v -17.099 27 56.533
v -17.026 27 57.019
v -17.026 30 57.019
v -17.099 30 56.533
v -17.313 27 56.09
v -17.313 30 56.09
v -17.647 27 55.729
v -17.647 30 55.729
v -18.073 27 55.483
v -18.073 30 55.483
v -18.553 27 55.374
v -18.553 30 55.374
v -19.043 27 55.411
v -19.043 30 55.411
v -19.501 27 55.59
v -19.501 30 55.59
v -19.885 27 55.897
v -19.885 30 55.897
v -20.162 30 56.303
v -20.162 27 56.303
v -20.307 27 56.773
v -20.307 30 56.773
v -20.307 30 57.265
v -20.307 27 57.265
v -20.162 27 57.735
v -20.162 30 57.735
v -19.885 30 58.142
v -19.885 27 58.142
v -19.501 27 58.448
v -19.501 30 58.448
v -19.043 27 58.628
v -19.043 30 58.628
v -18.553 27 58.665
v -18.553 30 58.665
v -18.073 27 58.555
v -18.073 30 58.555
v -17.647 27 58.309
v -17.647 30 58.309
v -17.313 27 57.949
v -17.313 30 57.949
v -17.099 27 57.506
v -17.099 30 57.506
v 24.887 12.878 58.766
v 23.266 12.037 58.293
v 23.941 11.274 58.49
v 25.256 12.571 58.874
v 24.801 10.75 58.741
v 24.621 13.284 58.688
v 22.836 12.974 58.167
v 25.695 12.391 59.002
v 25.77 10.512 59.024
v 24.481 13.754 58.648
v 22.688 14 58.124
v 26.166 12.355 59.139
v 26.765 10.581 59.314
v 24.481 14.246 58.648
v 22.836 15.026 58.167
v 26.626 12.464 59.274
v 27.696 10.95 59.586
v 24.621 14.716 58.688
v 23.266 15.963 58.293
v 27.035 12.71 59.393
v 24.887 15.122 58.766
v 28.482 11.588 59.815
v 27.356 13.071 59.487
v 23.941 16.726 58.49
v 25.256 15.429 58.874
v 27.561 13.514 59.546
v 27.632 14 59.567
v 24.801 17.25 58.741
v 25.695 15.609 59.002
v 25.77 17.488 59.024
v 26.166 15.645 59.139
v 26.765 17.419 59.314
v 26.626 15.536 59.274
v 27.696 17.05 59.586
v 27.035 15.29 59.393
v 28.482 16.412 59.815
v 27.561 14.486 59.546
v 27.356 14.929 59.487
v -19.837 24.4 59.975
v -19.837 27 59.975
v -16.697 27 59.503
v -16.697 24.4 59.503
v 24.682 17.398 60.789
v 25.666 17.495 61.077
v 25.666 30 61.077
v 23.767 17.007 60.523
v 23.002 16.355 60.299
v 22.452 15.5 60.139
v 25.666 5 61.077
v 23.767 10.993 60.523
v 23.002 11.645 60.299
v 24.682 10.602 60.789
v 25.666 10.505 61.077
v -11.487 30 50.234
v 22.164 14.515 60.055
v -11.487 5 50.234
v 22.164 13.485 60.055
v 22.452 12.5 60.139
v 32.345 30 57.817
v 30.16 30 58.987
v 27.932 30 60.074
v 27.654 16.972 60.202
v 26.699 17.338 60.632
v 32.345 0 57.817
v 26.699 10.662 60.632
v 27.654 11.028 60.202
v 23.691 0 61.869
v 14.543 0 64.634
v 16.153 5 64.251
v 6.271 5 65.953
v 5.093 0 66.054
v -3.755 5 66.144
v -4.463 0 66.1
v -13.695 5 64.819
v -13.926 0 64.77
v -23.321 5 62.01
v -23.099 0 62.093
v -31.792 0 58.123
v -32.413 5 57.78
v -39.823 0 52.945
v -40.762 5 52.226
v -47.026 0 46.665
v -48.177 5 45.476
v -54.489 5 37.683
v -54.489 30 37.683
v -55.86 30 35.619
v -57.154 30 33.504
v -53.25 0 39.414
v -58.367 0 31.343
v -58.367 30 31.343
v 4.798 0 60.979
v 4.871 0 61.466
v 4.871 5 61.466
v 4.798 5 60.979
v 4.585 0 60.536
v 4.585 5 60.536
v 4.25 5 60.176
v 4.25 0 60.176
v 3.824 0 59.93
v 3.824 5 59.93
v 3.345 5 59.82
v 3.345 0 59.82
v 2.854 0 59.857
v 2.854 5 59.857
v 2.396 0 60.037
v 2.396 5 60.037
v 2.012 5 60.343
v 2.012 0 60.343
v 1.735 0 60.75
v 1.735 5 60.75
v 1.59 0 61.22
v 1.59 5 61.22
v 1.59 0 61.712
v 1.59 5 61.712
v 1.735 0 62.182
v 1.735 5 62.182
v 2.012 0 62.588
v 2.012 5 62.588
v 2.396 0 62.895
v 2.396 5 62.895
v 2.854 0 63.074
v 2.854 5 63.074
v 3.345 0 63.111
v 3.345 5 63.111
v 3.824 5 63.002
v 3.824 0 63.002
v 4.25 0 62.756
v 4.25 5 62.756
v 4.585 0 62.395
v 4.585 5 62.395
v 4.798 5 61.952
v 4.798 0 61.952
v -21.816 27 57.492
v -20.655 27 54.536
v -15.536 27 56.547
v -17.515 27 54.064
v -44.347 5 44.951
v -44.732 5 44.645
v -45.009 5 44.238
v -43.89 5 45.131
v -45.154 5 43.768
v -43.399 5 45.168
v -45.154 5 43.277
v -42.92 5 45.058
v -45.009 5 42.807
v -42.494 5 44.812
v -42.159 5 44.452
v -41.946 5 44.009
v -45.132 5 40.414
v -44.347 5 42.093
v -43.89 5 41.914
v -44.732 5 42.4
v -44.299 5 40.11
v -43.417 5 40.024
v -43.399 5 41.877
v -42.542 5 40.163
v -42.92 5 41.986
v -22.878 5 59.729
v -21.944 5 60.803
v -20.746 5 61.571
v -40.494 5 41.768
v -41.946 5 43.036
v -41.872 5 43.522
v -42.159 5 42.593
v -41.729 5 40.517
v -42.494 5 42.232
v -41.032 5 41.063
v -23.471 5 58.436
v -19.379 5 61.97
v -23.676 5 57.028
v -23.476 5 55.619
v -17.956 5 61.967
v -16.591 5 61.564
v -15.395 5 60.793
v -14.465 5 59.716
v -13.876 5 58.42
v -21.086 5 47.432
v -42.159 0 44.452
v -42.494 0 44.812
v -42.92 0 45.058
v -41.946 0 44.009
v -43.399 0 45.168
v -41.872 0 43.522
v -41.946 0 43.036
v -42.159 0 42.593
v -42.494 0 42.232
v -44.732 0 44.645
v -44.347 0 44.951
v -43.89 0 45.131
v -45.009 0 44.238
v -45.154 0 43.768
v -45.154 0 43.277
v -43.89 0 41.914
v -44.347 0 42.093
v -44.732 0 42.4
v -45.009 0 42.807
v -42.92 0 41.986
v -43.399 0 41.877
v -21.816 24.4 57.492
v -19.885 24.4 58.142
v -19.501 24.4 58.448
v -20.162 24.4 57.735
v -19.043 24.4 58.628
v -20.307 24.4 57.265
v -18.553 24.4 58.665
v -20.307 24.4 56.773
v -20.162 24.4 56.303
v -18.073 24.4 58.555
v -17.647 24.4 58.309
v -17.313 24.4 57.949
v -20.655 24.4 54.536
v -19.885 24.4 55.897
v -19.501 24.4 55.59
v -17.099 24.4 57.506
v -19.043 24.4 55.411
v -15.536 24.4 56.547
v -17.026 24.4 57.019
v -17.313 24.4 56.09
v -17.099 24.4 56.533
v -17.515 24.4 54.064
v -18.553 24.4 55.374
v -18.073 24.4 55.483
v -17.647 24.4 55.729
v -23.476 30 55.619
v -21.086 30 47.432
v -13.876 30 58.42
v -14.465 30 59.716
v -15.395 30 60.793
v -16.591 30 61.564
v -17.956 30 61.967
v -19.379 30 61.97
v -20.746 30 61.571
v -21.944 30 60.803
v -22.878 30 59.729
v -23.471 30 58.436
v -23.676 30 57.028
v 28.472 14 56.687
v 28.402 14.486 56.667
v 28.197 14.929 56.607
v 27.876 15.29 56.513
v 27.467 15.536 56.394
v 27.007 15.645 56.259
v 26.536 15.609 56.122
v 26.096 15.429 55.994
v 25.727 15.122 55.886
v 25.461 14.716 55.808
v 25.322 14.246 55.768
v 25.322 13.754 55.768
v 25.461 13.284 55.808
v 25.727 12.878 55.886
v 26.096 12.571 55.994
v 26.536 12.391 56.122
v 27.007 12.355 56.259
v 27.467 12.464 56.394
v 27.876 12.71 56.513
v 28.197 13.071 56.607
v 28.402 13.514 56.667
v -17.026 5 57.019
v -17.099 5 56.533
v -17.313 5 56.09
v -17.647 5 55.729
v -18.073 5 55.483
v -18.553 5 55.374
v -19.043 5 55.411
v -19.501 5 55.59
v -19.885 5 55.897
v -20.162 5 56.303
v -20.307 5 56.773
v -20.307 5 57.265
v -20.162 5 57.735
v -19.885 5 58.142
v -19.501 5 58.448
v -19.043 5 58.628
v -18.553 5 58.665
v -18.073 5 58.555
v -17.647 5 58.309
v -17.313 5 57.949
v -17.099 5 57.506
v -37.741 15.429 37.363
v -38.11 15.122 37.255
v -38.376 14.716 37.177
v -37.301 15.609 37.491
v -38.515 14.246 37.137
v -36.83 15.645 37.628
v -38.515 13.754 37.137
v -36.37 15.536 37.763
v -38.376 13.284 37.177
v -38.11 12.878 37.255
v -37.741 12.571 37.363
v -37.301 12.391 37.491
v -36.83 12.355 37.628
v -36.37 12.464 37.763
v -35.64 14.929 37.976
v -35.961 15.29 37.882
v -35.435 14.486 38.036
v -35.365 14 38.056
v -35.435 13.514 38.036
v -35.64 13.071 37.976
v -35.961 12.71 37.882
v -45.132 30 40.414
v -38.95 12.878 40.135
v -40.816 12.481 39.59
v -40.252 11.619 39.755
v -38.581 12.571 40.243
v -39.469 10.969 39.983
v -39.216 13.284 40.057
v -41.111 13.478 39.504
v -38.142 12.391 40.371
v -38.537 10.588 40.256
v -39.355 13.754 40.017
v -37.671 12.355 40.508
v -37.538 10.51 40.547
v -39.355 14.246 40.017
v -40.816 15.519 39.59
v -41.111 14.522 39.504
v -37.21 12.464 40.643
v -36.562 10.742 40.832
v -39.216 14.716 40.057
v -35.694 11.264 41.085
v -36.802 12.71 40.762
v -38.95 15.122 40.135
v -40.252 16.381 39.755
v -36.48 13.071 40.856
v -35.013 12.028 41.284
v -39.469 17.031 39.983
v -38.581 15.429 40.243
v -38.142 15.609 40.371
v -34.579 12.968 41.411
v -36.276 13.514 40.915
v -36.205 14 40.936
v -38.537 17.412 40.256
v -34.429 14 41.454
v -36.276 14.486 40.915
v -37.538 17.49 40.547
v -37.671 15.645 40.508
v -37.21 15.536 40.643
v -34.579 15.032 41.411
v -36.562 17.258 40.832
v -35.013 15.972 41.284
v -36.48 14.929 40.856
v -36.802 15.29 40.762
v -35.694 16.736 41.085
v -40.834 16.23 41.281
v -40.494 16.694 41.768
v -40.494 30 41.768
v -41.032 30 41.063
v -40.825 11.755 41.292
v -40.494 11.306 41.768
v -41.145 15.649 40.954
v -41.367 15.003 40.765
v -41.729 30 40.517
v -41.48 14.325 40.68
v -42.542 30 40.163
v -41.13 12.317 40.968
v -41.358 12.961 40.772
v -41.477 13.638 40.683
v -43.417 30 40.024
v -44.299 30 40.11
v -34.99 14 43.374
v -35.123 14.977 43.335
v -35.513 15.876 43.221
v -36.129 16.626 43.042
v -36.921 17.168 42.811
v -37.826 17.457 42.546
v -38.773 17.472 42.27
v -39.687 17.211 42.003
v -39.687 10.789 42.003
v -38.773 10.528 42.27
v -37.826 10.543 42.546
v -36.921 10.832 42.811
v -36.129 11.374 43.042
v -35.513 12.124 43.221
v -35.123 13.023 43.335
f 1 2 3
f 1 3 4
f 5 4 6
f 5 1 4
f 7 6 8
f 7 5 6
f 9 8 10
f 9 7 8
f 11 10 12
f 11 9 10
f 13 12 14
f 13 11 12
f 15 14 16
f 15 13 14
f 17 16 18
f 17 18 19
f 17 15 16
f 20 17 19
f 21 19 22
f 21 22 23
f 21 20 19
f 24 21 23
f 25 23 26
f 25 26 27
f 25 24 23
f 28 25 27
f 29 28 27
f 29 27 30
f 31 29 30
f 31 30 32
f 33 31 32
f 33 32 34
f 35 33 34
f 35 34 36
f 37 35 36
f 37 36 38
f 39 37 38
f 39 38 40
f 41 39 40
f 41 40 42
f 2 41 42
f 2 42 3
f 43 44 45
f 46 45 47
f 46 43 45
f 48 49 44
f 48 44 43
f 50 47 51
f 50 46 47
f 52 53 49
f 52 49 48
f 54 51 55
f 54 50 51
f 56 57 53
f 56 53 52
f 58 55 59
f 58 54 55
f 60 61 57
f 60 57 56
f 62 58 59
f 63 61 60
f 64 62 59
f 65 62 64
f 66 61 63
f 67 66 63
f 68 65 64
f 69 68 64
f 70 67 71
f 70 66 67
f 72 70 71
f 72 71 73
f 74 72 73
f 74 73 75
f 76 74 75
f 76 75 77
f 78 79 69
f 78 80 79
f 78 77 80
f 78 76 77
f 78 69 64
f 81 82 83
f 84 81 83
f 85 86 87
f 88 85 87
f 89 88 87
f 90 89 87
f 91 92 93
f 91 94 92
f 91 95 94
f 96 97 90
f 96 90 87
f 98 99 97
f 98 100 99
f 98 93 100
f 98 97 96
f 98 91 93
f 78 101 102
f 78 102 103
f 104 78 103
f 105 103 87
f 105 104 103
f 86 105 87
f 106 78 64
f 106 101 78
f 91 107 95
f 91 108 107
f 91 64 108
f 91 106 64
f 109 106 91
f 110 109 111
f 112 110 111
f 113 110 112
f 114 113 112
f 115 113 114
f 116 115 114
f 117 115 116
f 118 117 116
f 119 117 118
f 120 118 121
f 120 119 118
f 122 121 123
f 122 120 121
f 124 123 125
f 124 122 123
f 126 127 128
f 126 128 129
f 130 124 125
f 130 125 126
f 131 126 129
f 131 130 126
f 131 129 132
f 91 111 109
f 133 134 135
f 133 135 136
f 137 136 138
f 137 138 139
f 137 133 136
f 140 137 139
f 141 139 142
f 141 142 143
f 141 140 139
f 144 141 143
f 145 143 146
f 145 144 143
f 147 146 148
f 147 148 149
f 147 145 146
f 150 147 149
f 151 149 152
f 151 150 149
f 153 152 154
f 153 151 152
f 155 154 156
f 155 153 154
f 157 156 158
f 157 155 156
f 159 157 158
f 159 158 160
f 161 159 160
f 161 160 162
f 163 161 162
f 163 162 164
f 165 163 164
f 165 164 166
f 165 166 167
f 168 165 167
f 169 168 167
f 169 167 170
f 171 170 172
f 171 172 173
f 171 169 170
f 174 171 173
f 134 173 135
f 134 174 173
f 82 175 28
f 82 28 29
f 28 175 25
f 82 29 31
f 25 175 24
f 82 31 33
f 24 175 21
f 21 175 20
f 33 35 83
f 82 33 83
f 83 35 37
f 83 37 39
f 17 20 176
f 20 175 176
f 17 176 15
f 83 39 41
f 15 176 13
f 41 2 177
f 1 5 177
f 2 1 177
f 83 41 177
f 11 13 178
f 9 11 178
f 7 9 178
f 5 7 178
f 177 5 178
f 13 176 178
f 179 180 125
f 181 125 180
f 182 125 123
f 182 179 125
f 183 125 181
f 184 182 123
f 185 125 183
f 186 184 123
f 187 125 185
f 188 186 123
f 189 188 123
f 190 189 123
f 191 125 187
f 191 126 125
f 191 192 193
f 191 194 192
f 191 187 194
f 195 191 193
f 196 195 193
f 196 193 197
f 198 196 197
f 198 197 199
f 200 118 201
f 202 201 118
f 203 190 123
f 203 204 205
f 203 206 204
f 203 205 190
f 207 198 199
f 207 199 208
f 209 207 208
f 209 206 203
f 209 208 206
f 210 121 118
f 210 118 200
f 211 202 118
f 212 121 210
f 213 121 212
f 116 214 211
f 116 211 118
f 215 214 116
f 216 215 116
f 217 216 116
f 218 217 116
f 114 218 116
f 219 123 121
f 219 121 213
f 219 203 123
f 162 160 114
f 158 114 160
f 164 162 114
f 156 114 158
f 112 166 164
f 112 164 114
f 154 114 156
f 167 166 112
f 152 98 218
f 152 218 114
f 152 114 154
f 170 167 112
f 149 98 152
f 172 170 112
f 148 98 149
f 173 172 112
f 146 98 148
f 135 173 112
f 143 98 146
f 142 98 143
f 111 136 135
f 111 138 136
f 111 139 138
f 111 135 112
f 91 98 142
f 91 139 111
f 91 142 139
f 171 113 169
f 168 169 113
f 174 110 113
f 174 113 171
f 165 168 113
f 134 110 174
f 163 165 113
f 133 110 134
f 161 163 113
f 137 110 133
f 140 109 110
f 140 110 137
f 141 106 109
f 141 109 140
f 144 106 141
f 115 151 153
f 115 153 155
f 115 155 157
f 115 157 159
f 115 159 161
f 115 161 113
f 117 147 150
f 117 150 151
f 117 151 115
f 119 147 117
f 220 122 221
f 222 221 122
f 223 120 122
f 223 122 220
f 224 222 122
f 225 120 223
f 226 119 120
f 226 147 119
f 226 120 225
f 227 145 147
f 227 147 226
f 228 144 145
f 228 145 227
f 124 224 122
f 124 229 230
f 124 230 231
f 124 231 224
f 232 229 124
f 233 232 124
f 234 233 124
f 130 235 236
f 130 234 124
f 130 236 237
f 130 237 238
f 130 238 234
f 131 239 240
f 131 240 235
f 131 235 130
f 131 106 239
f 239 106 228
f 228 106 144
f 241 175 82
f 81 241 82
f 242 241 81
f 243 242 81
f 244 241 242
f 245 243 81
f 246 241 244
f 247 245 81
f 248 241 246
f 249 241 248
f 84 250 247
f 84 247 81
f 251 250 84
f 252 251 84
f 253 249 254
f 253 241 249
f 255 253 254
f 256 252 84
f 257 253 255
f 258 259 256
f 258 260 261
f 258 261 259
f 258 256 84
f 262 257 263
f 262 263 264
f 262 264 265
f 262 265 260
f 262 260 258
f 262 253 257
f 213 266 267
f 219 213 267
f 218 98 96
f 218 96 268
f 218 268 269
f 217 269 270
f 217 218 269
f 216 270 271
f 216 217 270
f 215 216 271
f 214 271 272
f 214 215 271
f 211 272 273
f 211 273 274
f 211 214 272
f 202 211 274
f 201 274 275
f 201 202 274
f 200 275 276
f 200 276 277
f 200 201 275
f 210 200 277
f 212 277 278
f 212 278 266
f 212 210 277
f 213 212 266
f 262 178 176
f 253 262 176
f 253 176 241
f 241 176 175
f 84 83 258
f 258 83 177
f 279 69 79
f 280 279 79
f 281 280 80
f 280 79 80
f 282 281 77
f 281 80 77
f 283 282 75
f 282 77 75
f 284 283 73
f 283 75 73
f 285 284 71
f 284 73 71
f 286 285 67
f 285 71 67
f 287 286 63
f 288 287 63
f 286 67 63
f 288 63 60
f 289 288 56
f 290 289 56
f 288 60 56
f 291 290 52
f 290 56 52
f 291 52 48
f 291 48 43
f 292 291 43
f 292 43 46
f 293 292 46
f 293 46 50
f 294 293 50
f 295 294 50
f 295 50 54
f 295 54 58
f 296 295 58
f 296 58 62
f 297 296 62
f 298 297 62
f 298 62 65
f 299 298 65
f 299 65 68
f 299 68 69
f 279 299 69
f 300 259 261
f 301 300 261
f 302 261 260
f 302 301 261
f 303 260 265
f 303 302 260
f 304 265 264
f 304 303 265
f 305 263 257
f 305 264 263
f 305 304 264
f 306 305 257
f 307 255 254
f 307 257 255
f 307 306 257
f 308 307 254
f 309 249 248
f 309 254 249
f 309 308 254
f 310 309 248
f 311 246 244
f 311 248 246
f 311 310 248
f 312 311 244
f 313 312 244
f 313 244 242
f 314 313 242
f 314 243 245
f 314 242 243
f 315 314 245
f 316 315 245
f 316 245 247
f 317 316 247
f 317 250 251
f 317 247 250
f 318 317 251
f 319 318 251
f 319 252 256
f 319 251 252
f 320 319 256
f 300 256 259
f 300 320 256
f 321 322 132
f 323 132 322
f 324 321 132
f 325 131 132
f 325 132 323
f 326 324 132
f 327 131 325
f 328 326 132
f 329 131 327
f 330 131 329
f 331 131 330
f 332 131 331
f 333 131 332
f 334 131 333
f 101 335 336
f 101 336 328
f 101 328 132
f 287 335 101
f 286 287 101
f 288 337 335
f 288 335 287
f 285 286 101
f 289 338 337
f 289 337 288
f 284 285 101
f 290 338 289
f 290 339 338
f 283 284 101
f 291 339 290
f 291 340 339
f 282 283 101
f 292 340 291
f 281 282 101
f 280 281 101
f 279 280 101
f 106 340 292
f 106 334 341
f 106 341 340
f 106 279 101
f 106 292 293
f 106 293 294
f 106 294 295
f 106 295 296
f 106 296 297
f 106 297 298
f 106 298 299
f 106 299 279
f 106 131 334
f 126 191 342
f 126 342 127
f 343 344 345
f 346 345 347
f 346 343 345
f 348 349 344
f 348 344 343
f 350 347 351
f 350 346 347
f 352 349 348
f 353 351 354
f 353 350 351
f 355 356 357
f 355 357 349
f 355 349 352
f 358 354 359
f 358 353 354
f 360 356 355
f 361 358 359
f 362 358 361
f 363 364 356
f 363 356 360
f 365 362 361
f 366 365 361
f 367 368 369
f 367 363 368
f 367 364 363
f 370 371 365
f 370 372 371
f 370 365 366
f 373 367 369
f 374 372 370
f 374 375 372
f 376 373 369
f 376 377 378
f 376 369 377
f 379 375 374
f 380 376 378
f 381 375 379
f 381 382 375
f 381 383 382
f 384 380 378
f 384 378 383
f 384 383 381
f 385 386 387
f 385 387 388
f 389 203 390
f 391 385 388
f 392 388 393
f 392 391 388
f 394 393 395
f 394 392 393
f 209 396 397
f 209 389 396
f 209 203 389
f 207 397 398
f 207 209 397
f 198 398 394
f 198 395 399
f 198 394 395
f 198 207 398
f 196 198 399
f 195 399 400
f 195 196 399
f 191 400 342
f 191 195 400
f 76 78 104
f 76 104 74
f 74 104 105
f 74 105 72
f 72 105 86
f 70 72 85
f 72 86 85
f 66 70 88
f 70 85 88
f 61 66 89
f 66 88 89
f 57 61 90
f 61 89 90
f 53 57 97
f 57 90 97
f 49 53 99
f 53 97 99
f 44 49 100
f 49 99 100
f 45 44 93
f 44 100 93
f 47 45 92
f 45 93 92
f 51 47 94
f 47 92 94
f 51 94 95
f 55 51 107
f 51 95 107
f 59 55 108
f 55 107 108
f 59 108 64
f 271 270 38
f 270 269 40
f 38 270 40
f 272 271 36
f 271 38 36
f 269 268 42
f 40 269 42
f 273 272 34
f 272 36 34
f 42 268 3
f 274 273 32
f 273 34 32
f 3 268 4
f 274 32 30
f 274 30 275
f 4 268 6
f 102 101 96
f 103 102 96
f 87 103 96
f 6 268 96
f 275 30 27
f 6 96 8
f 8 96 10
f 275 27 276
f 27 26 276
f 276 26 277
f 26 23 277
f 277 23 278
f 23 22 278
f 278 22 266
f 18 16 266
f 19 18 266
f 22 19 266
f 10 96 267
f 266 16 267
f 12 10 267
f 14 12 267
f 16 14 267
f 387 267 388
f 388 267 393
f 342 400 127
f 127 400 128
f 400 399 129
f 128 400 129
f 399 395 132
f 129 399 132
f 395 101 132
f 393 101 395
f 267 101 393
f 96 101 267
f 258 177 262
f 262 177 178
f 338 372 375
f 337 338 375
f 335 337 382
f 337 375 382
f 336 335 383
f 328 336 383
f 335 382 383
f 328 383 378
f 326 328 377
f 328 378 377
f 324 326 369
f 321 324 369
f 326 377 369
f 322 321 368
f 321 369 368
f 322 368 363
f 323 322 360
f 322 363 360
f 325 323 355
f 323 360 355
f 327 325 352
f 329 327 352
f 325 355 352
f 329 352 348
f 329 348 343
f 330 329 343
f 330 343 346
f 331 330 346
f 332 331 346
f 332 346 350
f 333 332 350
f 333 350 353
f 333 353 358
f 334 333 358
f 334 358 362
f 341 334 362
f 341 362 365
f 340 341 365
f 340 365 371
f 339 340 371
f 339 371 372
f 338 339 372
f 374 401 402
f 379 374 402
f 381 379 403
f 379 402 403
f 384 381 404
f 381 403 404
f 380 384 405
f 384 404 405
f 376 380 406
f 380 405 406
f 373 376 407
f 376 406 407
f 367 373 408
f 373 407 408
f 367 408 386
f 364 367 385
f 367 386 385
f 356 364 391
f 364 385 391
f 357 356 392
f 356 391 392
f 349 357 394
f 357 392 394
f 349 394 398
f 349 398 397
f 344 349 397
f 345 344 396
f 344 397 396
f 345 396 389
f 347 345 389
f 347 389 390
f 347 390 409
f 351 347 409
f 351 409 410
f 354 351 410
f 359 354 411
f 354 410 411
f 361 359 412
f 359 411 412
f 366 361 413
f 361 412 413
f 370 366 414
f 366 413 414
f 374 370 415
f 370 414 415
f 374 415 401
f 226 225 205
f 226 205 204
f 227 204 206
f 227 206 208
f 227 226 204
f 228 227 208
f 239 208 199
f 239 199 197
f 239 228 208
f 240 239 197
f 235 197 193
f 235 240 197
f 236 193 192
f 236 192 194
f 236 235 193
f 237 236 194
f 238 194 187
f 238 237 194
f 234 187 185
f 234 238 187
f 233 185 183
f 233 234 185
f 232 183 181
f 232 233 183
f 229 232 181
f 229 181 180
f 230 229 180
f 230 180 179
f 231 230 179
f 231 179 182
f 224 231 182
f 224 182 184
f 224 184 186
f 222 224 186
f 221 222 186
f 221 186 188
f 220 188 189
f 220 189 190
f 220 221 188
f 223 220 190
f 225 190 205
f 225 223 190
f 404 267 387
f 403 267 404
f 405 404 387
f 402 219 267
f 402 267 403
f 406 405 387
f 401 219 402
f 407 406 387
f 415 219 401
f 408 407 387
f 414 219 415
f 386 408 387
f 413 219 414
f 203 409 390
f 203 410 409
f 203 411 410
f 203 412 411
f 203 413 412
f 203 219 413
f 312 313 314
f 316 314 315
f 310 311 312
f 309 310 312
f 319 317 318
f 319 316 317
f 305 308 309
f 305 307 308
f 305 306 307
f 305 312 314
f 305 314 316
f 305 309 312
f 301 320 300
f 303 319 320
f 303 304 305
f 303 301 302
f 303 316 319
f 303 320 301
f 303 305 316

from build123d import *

# Parameters (mm, degrees)
SKETCH1_R           = 1.65
BOSS_EXTRUDE1_DEPTH = 5
BOSS_EXTRUDE2_DEPTH = 25
SKETCH3_R           = 1.65
CUT_EXTRUDE1_DEPTH  = 31.640005718
SKETCH4_R           = 3.5
CUT_EXTRUDE2_DEPTH  = 2
SKETCH5_R           = 67.5
SKETCH5_R_2         = 66.25
CUT_EXTRUDE3_DEPTH  = 31.0000001
SKETCH6_R           = 1.65
BOSS_EXTRUDE3_DEPTH = 30
CUT_EXTRUDE4_START  = -3
CUT_EXTRUDE4_DEPTH  = 2.6


with BuildPart() as part:
    # Sketch1 → Boss-Extrude1 (new body)
    with BuildSketch(Plane(origin=(0, 0, 0), x_dir=(1, 0, 0), z_dir=(0, 1, 0))):
        with BuildLine():
            ThreePointArc((-58.769725256, -31.225340563), (-18.644922026, -63.884813396), (32.748082014, -57.935012077))
            Line((32.748082014, -57.935012077), (-58.769725256, -31.225340563))
        make_face()
        with Locations((-43.522422382, -43.522422382)):
            Circle(SKETCH1_R, mode=Mode.SUBTRACT)
        with Locations((3.221278107, -61.465647864)):
            Circle(SKETCH1_R, mode=Mode.SUBTRACT)
    extrude(amount=BOSS_EXTRUDE1_DEPTH)

    # Sketch2 → Boss-Extrude2 (add)
    with BuildSketch(Plane(origin=(0, 5, 0), x_dir=(1, 0, 0), z_dir=(0, 1, 0))):
        with BuildLine():
            Line((-58.769725256, -31.225340563), (32.748082014, -57.935012077))
            ThreePointArc((32.748082014, -57.935012077), (29.480015366, -59.664320946), (26.120952253, -61.20946294))
            Line((26.120952253, -61.20946294), (-40.494047404, -41.767730103))
            ThreePointArc((-40.494047404, -41.767730103), (-42.54184797, -40.162589972), (-45.131562946, -40.414261085))
            Line((-45.131562946, -40.414261085), (-54.944236671, -37.550410872))
            ThreePointArc((-54.944236671, -37.550410872), (-56.94486731, -34.441030575), (-58.769725256, -31.225340563))
        make_face()
    extrude(amount=BOSS_EXTRUDE2_DEPTH)

    # Sketch3 → Cut-Extrude1 (cut, through all)
    with BuildSketch(Plane(origin=(-14.411642209, 0, 49.379936906), x_dir=(0.959952117, 0, 0.280164118), z_dir=(-0.280164118, 0, 0.959952117))):
        with Locations((41.56355859, 14)):
            Circle(SKETCH3_R)
        with Locations((-24.93644141, 14)):
            Circle(SKETCH3_R)
    extrude(amount=-CUT_EXTRUDE1_DEPTH, mode=Mode.SUBTRACT)

    # Sketch4 → Cut-Extrude2 (cut)
    with BuildSketch(Plane(origin=(-14.411642209, 0, 49.379936906), x_dir=(0.959952117, 0, 0.280164118), z_dir=(-0.280164118, 0, 0.959952117))):
        with Locations((41.56355859, 14)):
            Circle(SKETCH4_R)
        with Locations((-24.93644141, 14)):
            Circle(SKETCH4_R)
    extrude(amount=-CUT_EXTRUDE2_DEPTH, mode=Mode.SUBTRACT)

    # Sketch5 → Cut-Extrude3 (cut, through all)
    with BuildSketch(Plane.XZ):
        Circle(SKETCH5_R)
        Circle(SKETCH5_R_2, mode=Mode.SUBTRACT)
    extrude(amount=-CUT_EXTRUDE3_DEPTH, mode=Mode.SUBTRACT)

    # Sketch6 → Boss-Extrude3 (add)
    with BuildSketch(Plane(origin=(0, 0, 0), x_dir=(1, 0, 0), z_dir=(0, 1, 0))):
        with BuildLine():
            Line((-23.475659958, -55.618568944), (-21.086364171, -47.431904754))
            Line((-21.086364171, -47.431904754), (-11.486842999, -50.23354593))
            Line((-11.486842999, -50.23354593), (-13.876138786, -58.42021012))
            ThreePointArc((-13.876138786, -58.42021012), (-20.07671996, -61.819150118), (-23.475659958, -55.618568944))
        make_face()
        with Locations((-18.675899372, -57.019389532)):
            Circle(SKETCH6_R, mode=Mode.SUBTRACT)
    extrude(amount=BOSS_EXTRUDE3_DEPTH)

    # Sketch7 → Cut-Extrude4 (cut)
    with BuildSketch(Plane(origin=(0, 30, 0), x_dir=(1, 0, 0), z_dir=(0, 1, 0)).offset(CUT_EXTRUDE4_START)):
        Polygon((-15.535775757, -56.547206291), (-17.514760247, -54.06387109), (-20.654883862, -54.536054331), (-21.816022987, -57.491572774), (-19.837038497, -59.974907975), (-16.696914882, -59.502724734), align=None)
    extrude(amount=-CUT_EXTRUDE4_DEPTH, mode=Mode.SUBTRACT)


solid = part.part
